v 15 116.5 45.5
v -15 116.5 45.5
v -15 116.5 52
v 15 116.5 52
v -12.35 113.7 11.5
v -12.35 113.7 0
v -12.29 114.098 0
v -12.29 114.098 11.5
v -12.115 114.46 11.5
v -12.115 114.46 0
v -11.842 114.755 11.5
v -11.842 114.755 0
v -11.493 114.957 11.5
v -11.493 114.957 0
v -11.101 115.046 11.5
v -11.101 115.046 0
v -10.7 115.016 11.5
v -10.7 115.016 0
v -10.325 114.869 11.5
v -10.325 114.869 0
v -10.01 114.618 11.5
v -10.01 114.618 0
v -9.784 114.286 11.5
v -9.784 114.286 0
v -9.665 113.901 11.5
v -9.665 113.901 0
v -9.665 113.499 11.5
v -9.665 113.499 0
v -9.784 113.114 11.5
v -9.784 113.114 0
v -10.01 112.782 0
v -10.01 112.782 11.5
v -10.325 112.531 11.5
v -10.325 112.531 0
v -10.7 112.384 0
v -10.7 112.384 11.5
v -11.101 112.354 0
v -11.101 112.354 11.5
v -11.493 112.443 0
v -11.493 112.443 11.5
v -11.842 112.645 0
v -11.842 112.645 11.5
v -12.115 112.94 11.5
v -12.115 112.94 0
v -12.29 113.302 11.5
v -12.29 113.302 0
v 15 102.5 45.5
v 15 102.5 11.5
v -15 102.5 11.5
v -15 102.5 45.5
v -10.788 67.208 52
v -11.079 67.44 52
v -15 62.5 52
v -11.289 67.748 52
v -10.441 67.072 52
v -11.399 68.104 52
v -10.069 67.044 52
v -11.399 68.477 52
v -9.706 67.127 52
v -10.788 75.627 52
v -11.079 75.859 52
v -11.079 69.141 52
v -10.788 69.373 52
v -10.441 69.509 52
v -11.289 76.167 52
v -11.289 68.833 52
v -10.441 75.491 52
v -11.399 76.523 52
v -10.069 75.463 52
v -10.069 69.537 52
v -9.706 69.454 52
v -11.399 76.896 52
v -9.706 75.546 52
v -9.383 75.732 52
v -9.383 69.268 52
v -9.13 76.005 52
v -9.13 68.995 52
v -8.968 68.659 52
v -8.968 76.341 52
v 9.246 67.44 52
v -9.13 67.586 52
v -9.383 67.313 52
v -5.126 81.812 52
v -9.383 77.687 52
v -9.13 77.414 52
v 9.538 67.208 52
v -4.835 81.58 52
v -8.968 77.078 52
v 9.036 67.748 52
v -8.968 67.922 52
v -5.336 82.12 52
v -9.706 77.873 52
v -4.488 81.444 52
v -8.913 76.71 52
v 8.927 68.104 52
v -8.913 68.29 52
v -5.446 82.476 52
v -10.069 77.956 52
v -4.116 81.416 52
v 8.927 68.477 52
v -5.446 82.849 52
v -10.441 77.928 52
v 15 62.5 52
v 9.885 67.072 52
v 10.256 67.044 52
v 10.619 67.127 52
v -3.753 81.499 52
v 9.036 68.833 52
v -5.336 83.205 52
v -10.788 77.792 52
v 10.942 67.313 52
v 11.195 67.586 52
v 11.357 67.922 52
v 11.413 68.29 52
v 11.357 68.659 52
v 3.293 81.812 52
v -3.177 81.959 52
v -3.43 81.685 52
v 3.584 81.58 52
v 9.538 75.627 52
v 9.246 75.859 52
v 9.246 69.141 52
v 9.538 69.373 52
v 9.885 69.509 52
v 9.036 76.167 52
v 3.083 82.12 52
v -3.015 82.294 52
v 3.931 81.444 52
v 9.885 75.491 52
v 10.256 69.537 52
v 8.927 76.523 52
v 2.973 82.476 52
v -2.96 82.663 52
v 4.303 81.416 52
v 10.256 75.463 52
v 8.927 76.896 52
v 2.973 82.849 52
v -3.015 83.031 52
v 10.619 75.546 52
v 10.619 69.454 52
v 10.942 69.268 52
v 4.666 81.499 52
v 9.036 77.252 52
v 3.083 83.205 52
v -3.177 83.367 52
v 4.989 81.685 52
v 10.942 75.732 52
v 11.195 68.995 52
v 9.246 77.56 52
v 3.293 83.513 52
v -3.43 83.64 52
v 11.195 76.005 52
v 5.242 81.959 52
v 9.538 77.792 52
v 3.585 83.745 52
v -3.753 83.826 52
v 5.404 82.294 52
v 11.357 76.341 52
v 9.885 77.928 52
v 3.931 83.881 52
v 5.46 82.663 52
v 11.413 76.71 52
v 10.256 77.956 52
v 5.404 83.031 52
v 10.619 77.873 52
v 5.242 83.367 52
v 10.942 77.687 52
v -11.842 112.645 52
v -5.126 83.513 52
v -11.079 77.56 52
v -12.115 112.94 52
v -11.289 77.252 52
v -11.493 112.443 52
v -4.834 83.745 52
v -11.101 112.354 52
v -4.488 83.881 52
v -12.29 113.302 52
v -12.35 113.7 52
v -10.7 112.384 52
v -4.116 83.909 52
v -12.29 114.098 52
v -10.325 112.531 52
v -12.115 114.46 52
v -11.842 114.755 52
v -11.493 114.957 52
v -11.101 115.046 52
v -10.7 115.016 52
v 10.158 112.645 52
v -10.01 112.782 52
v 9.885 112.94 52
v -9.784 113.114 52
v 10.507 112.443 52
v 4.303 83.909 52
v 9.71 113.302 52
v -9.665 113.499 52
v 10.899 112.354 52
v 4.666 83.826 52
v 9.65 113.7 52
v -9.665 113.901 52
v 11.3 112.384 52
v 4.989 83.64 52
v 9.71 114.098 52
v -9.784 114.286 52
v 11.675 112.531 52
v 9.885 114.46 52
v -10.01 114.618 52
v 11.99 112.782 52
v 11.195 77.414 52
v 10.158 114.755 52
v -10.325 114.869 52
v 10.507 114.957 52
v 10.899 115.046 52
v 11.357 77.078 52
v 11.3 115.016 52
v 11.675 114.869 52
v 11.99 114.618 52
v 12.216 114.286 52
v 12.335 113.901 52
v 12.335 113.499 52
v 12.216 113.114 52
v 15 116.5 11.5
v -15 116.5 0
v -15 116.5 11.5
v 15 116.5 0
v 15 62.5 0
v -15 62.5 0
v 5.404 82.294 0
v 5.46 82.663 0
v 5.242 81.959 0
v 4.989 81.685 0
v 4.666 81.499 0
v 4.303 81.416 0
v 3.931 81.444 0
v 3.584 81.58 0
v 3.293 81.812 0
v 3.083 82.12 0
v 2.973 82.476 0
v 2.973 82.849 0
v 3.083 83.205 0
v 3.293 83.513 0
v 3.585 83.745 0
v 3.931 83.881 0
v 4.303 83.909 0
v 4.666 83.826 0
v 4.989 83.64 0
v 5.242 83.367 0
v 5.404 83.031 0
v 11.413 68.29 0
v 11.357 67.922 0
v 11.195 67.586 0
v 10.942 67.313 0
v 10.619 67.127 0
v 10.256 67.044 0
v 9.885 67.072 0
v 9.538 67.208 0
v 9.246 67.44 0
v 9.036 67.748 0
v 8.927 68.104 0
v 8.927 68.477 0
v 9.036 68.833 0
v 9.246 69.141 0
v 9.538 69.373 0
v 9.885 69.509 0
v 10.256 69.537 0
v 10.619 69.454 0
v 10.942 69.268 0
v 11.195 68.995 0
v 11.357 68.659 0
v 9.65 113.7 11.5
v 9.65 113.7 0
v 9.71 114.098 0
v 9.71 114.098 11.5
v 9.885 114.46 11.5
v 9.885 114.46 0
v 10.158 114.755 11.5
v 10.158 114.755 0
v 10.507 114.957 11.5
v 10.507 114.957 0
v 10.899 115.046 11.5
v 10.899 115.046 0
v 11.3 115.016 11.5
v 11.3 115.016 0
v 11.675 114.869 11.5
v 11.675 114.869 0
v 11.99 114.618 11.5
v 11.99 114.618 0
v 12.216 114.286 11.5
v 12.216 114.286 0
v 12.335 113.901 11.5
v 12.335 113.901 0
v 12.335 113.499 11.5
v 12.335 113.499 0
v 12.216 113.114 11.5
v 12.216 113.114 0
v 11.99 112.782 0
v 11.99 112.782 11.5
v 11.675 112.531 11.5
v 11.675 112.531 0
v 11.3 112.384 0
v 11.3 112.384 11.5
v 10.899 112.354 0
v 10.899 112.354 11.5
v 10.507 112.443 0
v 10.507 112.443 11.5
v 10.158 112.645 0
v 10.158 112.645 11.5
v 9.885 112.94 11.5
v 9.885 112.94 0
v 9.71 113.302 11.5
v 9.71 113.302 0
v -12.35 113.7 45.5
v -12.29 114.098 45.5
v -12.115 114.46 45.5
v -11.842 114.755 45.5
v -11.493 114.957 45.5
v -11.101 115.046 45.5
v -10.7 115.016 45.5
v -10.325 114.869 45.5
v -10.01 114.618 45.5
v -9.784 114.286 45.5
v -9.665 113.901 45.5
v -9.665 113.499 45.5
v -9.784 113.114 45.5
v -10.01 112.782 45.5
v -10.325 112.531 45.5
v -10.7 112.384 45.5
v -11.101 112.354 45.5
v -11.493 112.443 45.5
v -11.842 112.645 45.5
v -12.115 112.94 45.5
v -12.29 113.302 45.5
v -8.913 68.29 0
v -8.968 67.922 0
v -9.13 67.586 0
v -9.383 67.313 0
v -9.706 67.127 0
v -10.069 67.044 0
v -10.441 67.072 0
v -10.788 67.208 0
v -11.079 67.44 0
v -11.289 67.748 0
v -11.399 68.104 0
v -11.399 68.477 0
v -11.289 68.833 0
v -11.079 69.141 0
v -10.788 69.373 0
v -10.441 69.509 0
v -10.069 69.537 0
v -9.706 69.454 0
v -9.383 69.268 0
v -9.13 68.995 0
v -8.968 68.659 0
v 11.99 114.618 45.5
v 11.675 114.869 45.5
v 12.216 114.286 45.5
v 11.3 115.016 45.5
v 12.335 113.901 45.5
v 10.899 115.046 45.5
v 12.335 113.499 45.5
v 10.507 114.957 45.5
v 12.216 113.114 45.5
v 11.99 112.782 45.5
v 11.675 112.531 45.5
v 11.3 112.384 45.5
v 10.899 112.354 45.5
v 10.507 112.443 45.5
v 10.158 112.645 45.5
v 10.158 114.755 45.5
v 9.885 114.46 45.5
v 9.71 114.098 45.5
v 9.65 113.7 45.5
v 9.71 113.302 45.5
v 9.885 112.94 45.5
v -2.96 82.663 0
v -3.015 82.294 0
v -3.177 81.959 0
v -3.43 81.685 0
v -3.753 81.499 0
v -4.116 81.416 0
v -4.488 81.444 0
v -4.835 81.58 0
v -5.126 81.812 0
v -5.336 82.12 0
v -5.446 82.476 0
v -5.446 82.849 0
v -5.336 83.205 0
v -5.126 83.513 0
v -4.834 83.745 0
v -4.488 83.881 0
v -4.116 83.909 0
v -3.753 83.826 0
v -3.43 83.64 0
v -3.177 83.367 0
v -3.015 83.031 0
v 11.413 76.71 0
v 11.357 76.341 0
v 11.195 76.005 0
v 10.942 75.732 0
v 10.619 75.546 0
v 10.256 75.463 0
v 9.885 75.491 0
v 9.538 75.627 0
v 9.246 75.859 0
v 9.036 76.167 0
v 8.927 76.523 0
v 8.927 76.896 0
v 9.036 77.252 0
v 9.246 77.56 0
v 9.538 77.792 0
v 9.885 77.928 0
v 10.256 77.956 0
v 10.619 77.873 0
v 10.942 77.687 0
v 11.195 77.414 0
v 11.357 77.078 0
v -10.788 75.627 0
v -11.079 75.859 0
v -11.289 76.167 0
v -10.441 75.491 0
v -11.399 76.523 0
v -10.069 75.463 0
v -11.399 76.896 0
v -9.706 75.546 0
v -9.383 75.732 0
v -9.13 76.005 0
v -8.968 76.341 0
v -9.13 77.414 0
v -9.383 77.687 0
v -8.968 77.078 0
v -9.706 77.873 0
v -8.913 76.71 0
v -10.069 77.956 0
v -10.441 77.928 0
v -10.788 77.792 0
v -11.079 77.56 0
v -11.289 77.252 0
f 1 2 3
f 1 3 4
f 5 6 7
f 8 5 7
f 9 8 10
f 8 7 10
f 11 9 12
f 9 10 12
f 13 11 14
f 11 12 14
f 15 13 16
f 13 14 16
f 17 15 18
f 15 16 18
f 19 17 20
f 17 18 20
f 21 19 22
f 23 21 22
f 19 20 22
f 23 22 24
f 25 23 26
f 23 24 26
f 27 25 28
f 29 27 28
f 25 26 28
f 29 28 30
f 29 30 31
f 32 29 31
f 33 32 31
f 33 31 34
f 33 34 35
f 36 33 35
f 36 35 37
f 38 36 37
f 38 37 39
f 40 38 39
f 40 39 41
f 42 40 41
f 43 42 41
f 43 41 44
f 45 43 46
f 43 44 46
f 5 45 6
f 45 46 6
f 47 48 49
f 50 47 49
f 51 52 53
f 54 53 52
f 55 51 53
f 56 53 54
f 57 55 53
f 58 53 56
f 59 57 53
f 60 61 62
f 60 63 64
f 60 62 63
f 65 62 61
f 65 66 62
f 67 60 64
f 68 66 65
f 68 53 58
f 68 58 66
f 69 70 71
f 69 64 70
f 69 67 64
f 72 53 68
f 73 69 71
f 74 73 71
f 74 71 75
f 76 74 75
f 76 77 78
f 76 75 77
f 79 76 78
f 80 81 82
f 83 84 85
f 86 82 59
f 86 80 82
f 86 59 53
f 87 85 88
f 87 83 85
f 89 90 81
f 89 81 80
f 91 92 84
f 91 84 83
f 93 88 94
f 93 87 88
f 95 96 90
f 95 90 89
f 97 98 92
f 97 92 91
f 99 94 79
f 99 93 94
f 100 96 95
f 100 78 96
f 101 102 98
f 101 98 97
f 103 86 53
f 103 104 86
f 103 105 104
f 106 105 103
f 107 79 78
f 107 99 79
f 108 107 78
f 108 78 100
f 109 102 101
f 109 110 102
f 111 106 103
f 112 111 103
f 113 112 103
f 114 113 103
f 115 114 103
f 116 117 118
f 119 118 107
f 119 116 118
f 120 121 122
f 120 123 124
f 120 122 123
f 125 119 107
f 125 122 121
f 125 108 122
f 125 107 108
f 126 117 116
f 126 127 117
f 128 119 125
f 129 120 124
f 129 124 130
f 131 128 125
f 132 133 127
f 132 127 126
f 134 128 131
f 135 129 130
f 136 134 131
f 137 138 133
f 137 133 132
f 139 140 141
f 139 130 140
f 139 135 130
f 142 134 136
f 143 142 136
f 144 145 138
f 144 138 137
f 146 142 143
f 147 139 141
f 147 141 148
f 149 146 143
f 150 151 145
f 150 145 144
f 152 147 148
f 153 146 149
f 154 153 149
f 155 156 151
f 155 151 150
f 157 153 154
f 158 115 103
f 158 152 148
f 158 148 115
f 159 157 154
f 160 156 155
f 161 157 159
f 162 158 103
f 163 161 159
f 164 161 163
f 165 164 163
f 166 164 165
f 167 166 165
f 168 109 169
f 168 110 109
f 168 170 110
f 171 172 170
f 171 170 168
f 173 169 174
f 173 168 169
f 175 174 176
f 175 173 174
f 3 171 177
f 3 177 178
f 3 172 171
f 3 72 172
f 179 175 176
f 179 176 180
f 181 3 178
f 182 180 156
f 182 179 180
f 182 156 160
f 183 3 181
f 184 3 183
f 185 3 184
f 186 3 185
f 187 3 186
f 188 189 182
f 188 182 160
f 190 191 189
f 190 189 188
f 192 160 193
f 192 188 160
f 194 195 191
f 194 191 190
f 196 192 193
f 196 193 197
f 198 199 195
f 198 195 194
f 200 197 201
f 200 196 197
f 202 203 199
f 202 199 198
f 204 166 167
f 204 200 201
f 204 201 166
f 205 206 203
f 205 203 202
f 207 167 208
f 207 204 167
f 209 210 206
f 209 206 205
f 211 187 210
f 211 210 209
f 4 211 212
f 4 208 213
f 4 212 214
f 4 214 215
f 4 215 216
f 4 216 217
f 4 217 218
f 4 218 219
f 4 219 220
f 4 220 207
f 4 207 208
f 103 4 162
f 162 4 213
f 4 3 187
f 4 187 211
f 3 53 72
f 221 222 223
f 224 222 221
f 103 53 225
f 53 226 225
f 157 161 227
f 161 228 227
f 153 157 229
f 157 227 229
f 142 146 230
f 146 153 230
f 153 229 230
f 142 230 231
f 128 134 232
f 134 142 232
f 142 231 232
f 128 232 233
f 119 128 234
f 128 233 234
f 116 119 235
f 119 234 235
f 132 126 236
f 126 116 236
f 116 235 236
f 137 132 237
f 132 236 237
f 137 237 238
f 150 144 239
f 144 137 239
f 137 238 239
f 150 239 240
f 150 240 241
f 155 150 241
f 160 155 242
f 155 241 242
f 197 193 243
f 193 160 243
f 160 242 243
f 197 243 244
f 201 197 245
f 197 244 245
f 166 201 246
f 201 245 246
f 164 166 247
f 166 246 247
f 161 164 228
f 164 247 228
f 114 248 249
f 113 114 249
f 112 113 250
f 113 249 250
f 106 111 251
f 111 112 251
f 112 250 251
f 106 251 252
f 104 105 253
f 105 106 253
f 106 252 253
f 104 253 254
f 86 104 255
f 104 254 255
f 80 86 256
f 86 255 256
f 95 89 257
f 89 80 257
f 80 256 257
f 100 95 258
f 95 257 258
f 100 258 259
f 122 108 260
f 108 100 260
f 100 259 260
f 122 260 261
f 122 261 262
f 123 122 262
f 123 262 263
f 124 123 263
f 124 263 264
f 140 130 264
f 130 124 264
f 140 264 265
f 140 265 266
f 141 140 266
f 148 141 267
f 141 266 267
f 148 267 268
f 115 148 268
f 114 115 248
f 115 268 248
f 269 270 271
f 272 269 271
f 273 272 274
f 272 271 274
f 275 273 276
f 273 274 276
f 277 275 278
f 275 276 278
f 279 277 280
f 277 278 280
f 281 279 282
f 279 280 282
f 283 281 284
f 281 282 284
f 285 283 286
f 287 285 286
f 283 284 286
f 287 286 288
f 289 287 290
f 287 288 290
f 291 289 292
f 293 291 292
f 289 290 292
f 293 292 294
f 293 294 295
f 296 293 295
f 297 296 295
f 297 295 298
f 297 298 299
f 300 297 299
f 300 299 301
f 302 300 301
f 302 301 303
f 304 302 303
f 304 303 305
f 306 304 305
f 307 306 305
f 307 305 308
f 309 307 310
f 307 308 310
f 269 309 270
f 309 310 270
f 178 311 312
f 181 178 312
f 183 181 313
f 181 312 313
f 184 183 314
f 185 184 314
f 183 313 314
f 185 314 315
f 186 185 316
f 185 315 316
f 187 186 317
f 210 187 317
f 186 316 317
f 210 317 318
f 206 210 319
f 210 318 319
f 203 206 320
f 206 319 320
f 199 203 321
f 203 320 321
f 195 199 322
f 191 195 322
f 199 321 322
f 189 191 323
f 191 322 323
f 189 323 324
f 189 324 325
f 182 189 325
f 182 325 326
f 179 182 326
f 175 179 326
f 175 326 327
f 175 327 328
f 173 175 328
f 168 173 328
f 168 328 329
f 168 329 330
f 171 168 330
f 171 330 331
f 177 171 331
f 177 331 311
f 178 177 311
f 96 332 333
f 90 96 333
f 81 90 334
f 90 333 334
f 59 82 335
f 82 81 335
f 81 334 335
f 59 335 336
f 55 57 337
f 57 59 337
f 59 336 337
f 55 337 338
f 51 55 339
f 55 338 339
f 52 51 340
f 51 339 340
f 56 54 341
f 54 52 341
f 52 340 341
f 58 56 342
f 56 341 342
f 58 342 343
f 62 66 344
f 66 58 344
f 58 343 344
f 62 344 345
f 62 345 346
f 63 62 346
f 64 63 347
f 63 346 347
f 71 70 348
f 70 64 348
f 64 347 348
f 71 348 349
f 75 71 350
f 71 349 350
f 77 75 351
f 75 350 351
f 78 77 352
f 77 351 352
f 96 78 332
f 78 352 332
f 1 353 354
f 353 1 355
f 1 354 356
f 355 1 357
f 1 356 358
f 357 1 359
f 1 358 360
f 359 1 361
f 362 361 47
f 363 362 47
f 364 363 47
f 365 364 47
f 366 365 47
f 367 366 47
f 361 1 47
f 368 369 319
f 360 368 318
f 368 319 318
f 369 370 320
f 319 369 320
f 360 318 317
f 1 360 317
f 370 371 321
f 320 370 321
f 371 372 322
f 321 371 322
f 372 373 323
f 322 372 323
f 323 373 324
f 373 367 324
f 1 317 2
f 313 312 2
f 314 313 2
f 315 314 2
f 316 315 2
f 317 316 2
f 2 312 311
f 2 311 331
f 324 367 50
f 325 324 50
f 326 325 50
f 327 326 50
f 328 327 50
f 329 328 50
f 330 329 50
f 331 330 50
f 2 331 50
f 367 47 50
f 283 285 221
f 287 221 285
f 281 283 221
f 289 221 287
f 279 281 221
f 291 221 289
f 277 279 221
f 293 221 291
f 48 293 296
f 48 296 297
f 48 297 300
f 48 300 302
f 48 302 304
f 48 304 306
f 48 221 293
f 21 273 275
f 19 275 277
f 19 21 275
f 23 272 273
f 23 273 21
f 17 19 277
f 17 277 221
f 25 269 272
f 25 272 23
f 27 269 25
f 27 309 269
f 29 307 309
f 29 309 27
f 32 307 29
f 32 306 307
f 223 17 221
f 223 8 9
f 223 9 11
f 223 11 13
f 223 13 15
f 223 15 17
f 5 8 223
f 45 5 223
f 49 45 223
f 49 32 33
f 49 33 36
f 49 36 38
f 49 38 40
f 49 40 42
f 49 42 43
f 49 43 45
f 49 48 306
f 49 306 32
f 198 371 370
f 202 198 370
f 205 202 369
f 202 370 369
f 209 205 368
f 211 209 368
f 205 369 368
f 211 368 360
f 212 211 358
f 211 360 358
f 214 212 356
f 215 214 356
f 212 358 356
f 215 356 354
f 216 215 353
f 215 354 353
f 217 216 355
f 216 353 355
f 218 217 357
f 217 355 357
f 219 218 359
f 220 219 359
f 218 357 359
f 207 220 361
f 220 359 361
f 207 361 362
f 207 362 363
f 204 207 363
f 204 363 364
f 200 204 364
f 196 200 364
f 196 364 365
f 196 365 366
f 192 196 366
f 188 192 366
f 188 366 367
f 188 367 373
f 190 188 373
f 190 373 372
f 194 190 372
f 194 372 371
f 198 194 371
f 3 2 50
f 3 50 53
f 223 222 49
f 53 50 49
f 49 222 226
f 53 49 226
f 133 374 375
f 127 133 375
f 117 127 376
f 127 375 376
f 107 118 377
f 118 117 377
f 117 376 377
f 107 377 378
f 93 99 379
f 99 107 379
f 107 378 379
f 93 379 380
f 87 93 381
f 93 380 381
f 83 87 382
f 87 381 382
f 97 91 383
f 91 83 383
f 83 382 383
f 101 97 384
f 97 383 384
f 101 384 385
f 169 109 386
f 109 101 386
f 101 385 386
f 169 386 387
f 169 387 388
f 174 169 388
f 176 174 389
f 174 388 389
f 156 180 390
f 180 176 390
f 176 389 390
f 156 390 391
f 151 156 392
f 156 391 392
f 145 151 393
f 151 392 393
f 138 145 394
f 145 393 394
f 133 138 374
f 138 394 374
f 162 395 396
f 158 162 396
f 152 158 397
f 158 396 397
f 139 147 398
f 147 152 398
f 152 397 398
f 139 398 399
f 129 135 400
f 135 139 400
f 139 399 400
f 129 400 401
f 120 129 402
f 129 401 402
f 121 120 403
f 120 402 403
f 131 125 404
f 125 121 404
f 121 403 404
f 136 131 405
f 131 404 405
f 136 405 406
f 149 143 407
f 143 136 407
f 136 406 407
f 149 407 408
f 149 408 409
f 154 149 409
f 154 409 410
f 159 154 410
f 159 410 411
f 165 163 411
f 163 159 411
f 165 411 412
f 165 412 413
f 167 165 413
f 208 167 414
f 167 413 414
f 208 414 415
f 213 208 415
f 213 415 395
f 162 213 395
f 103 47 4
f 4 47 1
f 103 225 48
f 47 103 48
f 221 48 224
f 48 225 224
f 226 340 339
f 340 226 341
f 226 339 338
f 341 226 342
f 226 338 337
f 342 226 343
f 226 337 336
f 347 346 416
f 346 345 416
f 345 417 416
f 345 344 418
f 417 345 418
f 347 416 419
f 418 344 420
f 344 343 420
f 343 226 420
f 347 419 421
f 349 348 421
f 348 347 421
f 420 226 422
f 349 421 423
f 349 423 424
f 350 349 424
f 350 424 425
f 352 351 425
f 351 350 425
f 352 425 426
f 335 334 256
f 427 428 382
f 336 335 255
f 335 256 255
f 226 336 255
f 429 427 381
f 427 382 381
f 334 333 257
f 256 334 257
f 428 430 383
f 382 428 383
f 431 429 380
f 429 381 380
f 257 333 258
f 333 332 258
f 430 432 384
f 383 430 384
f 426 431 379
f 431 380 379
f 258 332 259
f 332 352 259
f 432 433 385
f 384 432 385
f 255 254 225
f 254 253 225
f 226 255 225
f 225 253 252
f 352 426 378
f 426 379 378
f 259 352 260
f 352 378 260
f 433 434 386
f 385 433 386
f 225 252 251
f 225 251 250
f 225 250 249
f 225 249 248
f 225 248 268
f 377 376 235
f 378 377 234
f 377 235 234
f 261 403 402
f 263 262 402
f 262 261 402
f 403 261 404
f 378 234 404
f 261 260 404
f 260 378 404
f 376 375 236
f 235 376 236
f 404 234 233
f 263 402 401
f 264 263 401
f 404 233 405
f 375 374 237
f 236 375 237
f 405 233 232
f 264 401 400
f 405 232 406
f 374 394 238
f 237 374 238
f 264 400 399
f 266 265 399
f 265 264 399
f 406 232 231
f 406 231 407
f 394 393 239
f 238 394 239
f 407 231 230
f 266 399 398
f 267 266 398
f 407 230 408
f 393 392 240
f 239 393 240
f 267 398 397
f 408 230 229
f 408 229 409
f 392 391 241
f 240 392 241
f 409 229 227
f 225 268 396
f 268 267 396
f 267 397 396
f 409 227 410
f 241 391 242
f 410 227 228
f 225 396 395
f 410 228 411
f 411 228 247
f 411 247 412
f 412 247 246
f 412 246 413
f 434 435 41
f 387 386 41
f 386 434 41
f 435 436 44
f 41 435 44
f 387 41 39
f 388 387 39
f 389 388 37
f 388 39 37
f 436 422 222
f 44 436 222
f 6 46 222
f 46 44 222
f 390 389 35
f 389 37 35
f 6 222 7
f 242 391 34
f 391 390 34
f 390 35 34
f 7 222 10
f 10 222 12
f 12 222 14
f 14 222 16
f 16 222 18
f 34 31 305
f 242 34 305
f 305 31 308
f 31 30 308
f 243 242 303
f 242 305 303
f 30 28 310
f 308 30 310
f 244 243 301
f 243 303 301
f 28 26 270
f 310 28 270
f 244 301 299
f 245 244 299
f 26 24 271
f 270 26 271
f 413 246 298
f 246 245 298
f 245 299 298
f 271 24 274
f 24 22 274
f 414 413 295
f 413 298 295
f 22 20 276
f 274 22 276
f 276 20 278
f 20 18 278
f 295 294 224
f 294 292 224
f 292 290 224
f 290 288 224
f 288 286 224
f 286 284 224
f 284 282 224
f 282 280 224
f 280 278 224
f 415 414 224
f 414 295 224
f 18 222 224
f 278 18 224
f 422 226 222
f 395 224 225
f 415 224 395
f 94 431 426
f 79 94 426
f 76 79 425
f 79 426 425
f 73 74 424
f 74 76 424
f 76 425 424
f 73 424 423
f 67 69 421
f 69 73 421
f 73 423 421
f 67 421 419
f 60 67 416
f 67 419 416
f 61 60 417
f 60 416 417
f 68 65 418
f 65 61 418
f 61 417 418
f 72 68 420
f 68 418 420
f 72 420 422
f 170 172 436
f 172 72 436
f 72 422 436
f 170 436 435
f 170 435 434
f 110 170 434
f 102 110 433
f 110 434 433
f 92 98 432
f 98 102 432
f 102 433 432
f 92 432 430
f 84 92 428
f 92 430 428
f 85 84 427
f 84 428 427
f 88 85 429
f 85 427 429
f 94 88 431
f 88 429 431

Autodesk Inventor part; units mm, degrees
ref_plane "YZ Plane" through (0, 0, 0) normal (1, 0, 0) x (0, 1, 0)
sketch "스케치1" plane through (0, 0, 0) normal (0, 0, 1) x (1, 0, 0)
  arc A0 (15, 100.5) -> (13, 102.5) centre (13, 100.5) ccw projected
  line L0 (13, 102.5) -> (-13, 102.5) projected
  arc A1 (-13, 102.5) -> (-15, 100.5) centre (-13, 100.5) ccw projected
  line L1 (-15, 100.5) -> (-15, -100.5) projected
  arc A2 (-15, -100.5) -> (-13, -102.5) centre (-13, -100.5) ccw projected
  line L2 (-13, -102.5) -> (-7, -102.5) projected
  arc A3 (-7, -102.5) -> (-5, -100.5) centre (-7, -100.5) ccw projected
  line L3 (-5, -100.5) -> (-5, -92.5) projected
  arc A4 (5, -92.5) -> (-5, -92.5) centre (0, -92.5) ccw projected
  line L4 (5, -92.5) -> (5, -100.5) projected
  arc A5 (5, -100.5) -> (7, -102.5) centre (7, -100.5) ccw projected
  line L5 (7, -102.5) -> (13, -102.5) projected
  arc A6 (13, -102.5) -> (15, -100.5) centre (13, -100.5) ccw projected
  line L6 (15, -100.5) -> (15, 100.5) projected
  circle A7 centre (7.7782, -100.2782) radius 1.25 projected
  circle A8 centre (0, -81.5) radius 1.25 projected
  circle A9 centre (-11, -92.5) radius 1.25 projected
  circle A10 centre (11, -92.5) radius 1.25 projected
  circle A11 centre (-7.7782, -100.2782) radius 1.25 projected
  circle A12 centre (7.7782, -84.7218) radius 1.25 projected
  circle A13 centre (-7.7782, -84.7218) radius 1.25 projected
  circle A14 centre (-10.1627, 76.7095) radius 1.25 projected
  circle A15 centre (-10.1627, 68.2905) radius 1.25 projected
  circle A16 centre (10.1627, 68.2905) radius 1.25 projected
  circle A17 centre (10.1627, 76.7095) radius 1.25 projected
  circle A18 centre (4.2095, 82.6627) radius 1.25 projected
  circle A19 centre (-4.2095, 82.6627) radius 1.25 projected
  line L7 (0, 102.5) -> (0, 82.5)
  line L8 (15, 102.5) -> (-15, 102.5)
  line L9 (-15, 102.5) -> (-15, 62.5)
  line L10 (-15, 62.5) -> (15, 62.5)
  line L11 (15, 62.5) -> (15, 102.5)
  line L12 (15, 102.5) -> (-15, 62.5) construction
  line L13 (-15, 102.5) -> (15, 62.5) construction
  point P0 (0, 0)
  dimension "d0" = 20
  dimension "d1" = 40
ref_plane "작업 평면1" through (-15, -102.5, 52) normal (0, 0, -1) x (0, 1, 0)
extrude "돌출1" add sketch "스케치1" along normal up to surface (52 mm away) contours L6 L10 L1 A1 L0 A0
sketch "스케치2" plane through (-13, 102.5, 0) normal (0, 1, 0) x (1, 0, 0)
  line L0 (-0.4121, -11.5) -> (26.4121, -11.5) projected
  line L1 (-0.4121, -45.5) -> (26.4121, -45.5) projected
  line L2 (-2, 0) -> (-2, -52) projected
  line L3 (28, 0) -> (28, -52) projected
  line L4 (-2, -52) -> (28, -52)
  line L5 (28, -52) -> (28, -45.5)
  line L6 (28, -45.5) -> (-2, -45.5)
  line L7 (-2, -45.5) -> (-2, -52)
  line L8 (-2, 0) -> (28, 0)
  line L9 (28, 0) -> (28, -11.5)
  line L10 (28, -11.5) -> (-2, -11.5)
  line L11 (-2, -11.5) -> (-2, 0)
  point P0 (13, 0)
  dimension "d4" = 30
ref_plane "작업 평면2" through (-7.15, 116.5, 9.5) normal (0, -1, 0) x (1, 0, 0)
extrude "돌출2" add sketch "스케치2" along normal up to surface (14 mm away) contours L10 L2 L8 L3 L0 | L6 L1 L3 L4 L2
sketch "스케치3" plane through (0, 0, 0) normal (0, 0, -1) x (-1, 0, 0)
  line L0 (-15, 102.5) -> (-13, 102.5) projected
  line L1 (-15, 62.5) -> (-15, 100.5) projected
  line L2 (-15, 102.5) -> (-15, 100.5)
  line L3 (15, 100.5) -> (15, 62.5) projected
  line L4 (-15, 100.5) -> (15, 100.5)
  line L5 (15, 100.5) -> (15, 102.5)
  arc A0 (15, 100.5) -> (13, 102.5) centre (13, 100.5) ccw projected
  line L6 (-15, 102.5) -> (15, 102.5)
  line L7 (13, 102.5) -> (-13, 102.5) projected
  point P0 (0, 0)
extrude "돌출3" add sketch "스케치3" against normal up to surface (52 mm away)
sketch "스케치4" plane through (0, 0, 0) normal (0, 0, -1) x (-1, 0, 0)
  circle A0 centre (-17.3, 119) radius 1.35 projected
  circle A1 centre (17.3, 119) radius 1.35 projected
  line L0 (-20.1, 119.3234) -> (-20.1, 163.5766) projected
  arc A2 (-20.1, 119.3234) -> (-19.5808, 117.6364) centre (-17.1, 119.3234) ccw projected
  line L1 (-15.8929, 112.2131) -> (-19.5808, 117.6364) projected
  arc A3 (-15.8929, 112.2131) -> (-13.4121, 110.9) centre (-13.4121, 113.9) ccw projected
  line L2 (13.4121, 110.9) -> (-13.4121, 110.9) projected
  arc A4 (13.4121, 110.9) -> (15.8929, 112.2131) centre (13.4121, 113.9) ccw projected
  line L3 (19.5808, 117.6364) -> (15.8929, 112.2131) projected
  arc A5 (19.5808, 117.6364) -> (20.1, 119.3234) centre (17.1, 119.3234) ccw projected
  line L4 (20.1, 163.5766) -> (20.1, 119.3234) projected
  arc A6 (20.1, 163.5766) -> (19.5808, 165.2636) centre (17.1, 163.5766) ccw projected
  line L5 (15.5953, 171.1246) -> (19.5808, 165.2636) projected
  arc A7 (15.5953, 171.1246) -> (13.9414, 172) centre (13.9414, 170) ccw projected
  line L6 (6.65, 172) -> (13.9414, 172) projected
  arc A8 (8.15, 170.5) -> (6.65, 172) centre (6.65, 170.5) ccw projected
  line L7 (8.15, 170.5) -> (8.15, 168) projected
  arc A9 (8.15, 168) -> (10.5, 165.65) centre (10.5, 168) ccw projected
  line L8 (10.5, 165.65) -> (13.5, 165.65) projected
  arc A10 (14.5, 164.65) -> (13.5, 165.65) centre (13.5, 164.65) ccw projected
  line L9 (14.5, 164.65) -> (14.5, 123.85) projected
  arc A11 (13.5, 122.85) -> (14.5, 123.85) centre (13.5, 123.85) ccw projected
  line L10 (13.5, 122.85) -> (10.5, 122.85) projected
  arc A12 (10.5, 122.85) -> (8.15, 120.5) centre (10.5, 120.5) ccw projected
  line L11 (8.15, 120.5) -> (8.15, 117.5) projected
  arc A13 (7.15, 116.5) -> (8.15, 117.5) centre (7.15, 117.5) ccw projected
  line L12 (7.15, 116.5) -> (-7.15, 116.5) projected
  arc A14 (-8.15, 117.5) -> (-7.15, 116.5) centre (-7.15, 117.5) ccw projected
  line L13 (-8.15, 117.5) -> (-8.15, 120.5) projected
  arc A15 (-8.15, 120.5) -> (-10.5, 122.85) centre (-10.5, 120.5) ccw projected
  line L14 (-10.5, 122.85) -> (-13.5, 122.85) projected
  arc A16 (-14.5, 123.85) -> (-13.5, 122.85) centre (-13.5, 123.85) ccw projected
  line L15 (-14.5, 123.85) -> (-14.5, 164.65) projected
  arc A17 (-13.5, 165.65) -> (-14.5, 164.65) centre (-13.5, 164.65) ccw projected
  line L16 (-13.5, 165.65) -> (-10.5, 165.65) projected
  arc A18 (-10.5, 165.65) -> (-8.15, 168) centre (-10.5, 168) ccw projected
  line L17 (-8.15, 168) -> (-8.15, 170.5) projected
  arc A19 (-6.65, 172) -> (-8.15, 170.5) centre (-6.65, 170.5) ccw projected
  line L18 (-13.9414, 172) -> (-6.65, 172) projected
  arc A20 (-13.9414, 172) -> (-15.5953, 171.1246) centre (-13.9414, 170) ccw projected
  line L19 (-19.5808, 165.2636) -> (-15.5953, 171.1246) projected
  arc A21 (-19.5808, 165.2636) -> (-20.1, 163.5766) centre (-17.1, 163.5766) ccw projected
  arc A22 (15.95, 163) -> (18.65, 163) centre (17.3, 163) ccw projected
  arc A23 (18.65, 163) -> (15.95, 163) centre (17.3, 163) ccw projected
  arc A24 (15.95, 141) -> (18.65, 141) centre (17.3, 141) ccw projected
  arc A25 (18.65, 141) -> (15.95, 141) centre (17.3, 141) ccw projected
  arc A26 (9.65, 113.7) -> (12.35, 113.7) centre (11, 113.7) ccw projected
  arc A27 (12.35, 113.7) -> (9.65, 113.7) centre (11, 113.7) ccw projected
  arc A28 (-18.65, 163) -> (-15.95, 163) centre (-17.3, 163) ccw projected
  arc A29 (-15.95, 163) -> (-18.65, 163) centre (-17.3, 163) ccw projected
  arc A30 (-18.65, 141) -> (-15.95, 141) centre (-17.3, 141) ccw projected
  arc A31 (-15.95, 141) -> (-18.65, 141) centre (-17.3, 141) ccw projected
  arc A32 (-12.35, 113.7) -> (-9.65, 113.7) centre (-11, 113.7) ccw projected
  arc A33 (-9.65, 113.7) -> (-12.35, 113.7) centre (-11, 113.7) ccw projected
  point P0 (0, 0)
extrude "돌출4" cut sketch "스케치4" against normal through all contours A27 A26 | A33 A32
properties part number "link"
